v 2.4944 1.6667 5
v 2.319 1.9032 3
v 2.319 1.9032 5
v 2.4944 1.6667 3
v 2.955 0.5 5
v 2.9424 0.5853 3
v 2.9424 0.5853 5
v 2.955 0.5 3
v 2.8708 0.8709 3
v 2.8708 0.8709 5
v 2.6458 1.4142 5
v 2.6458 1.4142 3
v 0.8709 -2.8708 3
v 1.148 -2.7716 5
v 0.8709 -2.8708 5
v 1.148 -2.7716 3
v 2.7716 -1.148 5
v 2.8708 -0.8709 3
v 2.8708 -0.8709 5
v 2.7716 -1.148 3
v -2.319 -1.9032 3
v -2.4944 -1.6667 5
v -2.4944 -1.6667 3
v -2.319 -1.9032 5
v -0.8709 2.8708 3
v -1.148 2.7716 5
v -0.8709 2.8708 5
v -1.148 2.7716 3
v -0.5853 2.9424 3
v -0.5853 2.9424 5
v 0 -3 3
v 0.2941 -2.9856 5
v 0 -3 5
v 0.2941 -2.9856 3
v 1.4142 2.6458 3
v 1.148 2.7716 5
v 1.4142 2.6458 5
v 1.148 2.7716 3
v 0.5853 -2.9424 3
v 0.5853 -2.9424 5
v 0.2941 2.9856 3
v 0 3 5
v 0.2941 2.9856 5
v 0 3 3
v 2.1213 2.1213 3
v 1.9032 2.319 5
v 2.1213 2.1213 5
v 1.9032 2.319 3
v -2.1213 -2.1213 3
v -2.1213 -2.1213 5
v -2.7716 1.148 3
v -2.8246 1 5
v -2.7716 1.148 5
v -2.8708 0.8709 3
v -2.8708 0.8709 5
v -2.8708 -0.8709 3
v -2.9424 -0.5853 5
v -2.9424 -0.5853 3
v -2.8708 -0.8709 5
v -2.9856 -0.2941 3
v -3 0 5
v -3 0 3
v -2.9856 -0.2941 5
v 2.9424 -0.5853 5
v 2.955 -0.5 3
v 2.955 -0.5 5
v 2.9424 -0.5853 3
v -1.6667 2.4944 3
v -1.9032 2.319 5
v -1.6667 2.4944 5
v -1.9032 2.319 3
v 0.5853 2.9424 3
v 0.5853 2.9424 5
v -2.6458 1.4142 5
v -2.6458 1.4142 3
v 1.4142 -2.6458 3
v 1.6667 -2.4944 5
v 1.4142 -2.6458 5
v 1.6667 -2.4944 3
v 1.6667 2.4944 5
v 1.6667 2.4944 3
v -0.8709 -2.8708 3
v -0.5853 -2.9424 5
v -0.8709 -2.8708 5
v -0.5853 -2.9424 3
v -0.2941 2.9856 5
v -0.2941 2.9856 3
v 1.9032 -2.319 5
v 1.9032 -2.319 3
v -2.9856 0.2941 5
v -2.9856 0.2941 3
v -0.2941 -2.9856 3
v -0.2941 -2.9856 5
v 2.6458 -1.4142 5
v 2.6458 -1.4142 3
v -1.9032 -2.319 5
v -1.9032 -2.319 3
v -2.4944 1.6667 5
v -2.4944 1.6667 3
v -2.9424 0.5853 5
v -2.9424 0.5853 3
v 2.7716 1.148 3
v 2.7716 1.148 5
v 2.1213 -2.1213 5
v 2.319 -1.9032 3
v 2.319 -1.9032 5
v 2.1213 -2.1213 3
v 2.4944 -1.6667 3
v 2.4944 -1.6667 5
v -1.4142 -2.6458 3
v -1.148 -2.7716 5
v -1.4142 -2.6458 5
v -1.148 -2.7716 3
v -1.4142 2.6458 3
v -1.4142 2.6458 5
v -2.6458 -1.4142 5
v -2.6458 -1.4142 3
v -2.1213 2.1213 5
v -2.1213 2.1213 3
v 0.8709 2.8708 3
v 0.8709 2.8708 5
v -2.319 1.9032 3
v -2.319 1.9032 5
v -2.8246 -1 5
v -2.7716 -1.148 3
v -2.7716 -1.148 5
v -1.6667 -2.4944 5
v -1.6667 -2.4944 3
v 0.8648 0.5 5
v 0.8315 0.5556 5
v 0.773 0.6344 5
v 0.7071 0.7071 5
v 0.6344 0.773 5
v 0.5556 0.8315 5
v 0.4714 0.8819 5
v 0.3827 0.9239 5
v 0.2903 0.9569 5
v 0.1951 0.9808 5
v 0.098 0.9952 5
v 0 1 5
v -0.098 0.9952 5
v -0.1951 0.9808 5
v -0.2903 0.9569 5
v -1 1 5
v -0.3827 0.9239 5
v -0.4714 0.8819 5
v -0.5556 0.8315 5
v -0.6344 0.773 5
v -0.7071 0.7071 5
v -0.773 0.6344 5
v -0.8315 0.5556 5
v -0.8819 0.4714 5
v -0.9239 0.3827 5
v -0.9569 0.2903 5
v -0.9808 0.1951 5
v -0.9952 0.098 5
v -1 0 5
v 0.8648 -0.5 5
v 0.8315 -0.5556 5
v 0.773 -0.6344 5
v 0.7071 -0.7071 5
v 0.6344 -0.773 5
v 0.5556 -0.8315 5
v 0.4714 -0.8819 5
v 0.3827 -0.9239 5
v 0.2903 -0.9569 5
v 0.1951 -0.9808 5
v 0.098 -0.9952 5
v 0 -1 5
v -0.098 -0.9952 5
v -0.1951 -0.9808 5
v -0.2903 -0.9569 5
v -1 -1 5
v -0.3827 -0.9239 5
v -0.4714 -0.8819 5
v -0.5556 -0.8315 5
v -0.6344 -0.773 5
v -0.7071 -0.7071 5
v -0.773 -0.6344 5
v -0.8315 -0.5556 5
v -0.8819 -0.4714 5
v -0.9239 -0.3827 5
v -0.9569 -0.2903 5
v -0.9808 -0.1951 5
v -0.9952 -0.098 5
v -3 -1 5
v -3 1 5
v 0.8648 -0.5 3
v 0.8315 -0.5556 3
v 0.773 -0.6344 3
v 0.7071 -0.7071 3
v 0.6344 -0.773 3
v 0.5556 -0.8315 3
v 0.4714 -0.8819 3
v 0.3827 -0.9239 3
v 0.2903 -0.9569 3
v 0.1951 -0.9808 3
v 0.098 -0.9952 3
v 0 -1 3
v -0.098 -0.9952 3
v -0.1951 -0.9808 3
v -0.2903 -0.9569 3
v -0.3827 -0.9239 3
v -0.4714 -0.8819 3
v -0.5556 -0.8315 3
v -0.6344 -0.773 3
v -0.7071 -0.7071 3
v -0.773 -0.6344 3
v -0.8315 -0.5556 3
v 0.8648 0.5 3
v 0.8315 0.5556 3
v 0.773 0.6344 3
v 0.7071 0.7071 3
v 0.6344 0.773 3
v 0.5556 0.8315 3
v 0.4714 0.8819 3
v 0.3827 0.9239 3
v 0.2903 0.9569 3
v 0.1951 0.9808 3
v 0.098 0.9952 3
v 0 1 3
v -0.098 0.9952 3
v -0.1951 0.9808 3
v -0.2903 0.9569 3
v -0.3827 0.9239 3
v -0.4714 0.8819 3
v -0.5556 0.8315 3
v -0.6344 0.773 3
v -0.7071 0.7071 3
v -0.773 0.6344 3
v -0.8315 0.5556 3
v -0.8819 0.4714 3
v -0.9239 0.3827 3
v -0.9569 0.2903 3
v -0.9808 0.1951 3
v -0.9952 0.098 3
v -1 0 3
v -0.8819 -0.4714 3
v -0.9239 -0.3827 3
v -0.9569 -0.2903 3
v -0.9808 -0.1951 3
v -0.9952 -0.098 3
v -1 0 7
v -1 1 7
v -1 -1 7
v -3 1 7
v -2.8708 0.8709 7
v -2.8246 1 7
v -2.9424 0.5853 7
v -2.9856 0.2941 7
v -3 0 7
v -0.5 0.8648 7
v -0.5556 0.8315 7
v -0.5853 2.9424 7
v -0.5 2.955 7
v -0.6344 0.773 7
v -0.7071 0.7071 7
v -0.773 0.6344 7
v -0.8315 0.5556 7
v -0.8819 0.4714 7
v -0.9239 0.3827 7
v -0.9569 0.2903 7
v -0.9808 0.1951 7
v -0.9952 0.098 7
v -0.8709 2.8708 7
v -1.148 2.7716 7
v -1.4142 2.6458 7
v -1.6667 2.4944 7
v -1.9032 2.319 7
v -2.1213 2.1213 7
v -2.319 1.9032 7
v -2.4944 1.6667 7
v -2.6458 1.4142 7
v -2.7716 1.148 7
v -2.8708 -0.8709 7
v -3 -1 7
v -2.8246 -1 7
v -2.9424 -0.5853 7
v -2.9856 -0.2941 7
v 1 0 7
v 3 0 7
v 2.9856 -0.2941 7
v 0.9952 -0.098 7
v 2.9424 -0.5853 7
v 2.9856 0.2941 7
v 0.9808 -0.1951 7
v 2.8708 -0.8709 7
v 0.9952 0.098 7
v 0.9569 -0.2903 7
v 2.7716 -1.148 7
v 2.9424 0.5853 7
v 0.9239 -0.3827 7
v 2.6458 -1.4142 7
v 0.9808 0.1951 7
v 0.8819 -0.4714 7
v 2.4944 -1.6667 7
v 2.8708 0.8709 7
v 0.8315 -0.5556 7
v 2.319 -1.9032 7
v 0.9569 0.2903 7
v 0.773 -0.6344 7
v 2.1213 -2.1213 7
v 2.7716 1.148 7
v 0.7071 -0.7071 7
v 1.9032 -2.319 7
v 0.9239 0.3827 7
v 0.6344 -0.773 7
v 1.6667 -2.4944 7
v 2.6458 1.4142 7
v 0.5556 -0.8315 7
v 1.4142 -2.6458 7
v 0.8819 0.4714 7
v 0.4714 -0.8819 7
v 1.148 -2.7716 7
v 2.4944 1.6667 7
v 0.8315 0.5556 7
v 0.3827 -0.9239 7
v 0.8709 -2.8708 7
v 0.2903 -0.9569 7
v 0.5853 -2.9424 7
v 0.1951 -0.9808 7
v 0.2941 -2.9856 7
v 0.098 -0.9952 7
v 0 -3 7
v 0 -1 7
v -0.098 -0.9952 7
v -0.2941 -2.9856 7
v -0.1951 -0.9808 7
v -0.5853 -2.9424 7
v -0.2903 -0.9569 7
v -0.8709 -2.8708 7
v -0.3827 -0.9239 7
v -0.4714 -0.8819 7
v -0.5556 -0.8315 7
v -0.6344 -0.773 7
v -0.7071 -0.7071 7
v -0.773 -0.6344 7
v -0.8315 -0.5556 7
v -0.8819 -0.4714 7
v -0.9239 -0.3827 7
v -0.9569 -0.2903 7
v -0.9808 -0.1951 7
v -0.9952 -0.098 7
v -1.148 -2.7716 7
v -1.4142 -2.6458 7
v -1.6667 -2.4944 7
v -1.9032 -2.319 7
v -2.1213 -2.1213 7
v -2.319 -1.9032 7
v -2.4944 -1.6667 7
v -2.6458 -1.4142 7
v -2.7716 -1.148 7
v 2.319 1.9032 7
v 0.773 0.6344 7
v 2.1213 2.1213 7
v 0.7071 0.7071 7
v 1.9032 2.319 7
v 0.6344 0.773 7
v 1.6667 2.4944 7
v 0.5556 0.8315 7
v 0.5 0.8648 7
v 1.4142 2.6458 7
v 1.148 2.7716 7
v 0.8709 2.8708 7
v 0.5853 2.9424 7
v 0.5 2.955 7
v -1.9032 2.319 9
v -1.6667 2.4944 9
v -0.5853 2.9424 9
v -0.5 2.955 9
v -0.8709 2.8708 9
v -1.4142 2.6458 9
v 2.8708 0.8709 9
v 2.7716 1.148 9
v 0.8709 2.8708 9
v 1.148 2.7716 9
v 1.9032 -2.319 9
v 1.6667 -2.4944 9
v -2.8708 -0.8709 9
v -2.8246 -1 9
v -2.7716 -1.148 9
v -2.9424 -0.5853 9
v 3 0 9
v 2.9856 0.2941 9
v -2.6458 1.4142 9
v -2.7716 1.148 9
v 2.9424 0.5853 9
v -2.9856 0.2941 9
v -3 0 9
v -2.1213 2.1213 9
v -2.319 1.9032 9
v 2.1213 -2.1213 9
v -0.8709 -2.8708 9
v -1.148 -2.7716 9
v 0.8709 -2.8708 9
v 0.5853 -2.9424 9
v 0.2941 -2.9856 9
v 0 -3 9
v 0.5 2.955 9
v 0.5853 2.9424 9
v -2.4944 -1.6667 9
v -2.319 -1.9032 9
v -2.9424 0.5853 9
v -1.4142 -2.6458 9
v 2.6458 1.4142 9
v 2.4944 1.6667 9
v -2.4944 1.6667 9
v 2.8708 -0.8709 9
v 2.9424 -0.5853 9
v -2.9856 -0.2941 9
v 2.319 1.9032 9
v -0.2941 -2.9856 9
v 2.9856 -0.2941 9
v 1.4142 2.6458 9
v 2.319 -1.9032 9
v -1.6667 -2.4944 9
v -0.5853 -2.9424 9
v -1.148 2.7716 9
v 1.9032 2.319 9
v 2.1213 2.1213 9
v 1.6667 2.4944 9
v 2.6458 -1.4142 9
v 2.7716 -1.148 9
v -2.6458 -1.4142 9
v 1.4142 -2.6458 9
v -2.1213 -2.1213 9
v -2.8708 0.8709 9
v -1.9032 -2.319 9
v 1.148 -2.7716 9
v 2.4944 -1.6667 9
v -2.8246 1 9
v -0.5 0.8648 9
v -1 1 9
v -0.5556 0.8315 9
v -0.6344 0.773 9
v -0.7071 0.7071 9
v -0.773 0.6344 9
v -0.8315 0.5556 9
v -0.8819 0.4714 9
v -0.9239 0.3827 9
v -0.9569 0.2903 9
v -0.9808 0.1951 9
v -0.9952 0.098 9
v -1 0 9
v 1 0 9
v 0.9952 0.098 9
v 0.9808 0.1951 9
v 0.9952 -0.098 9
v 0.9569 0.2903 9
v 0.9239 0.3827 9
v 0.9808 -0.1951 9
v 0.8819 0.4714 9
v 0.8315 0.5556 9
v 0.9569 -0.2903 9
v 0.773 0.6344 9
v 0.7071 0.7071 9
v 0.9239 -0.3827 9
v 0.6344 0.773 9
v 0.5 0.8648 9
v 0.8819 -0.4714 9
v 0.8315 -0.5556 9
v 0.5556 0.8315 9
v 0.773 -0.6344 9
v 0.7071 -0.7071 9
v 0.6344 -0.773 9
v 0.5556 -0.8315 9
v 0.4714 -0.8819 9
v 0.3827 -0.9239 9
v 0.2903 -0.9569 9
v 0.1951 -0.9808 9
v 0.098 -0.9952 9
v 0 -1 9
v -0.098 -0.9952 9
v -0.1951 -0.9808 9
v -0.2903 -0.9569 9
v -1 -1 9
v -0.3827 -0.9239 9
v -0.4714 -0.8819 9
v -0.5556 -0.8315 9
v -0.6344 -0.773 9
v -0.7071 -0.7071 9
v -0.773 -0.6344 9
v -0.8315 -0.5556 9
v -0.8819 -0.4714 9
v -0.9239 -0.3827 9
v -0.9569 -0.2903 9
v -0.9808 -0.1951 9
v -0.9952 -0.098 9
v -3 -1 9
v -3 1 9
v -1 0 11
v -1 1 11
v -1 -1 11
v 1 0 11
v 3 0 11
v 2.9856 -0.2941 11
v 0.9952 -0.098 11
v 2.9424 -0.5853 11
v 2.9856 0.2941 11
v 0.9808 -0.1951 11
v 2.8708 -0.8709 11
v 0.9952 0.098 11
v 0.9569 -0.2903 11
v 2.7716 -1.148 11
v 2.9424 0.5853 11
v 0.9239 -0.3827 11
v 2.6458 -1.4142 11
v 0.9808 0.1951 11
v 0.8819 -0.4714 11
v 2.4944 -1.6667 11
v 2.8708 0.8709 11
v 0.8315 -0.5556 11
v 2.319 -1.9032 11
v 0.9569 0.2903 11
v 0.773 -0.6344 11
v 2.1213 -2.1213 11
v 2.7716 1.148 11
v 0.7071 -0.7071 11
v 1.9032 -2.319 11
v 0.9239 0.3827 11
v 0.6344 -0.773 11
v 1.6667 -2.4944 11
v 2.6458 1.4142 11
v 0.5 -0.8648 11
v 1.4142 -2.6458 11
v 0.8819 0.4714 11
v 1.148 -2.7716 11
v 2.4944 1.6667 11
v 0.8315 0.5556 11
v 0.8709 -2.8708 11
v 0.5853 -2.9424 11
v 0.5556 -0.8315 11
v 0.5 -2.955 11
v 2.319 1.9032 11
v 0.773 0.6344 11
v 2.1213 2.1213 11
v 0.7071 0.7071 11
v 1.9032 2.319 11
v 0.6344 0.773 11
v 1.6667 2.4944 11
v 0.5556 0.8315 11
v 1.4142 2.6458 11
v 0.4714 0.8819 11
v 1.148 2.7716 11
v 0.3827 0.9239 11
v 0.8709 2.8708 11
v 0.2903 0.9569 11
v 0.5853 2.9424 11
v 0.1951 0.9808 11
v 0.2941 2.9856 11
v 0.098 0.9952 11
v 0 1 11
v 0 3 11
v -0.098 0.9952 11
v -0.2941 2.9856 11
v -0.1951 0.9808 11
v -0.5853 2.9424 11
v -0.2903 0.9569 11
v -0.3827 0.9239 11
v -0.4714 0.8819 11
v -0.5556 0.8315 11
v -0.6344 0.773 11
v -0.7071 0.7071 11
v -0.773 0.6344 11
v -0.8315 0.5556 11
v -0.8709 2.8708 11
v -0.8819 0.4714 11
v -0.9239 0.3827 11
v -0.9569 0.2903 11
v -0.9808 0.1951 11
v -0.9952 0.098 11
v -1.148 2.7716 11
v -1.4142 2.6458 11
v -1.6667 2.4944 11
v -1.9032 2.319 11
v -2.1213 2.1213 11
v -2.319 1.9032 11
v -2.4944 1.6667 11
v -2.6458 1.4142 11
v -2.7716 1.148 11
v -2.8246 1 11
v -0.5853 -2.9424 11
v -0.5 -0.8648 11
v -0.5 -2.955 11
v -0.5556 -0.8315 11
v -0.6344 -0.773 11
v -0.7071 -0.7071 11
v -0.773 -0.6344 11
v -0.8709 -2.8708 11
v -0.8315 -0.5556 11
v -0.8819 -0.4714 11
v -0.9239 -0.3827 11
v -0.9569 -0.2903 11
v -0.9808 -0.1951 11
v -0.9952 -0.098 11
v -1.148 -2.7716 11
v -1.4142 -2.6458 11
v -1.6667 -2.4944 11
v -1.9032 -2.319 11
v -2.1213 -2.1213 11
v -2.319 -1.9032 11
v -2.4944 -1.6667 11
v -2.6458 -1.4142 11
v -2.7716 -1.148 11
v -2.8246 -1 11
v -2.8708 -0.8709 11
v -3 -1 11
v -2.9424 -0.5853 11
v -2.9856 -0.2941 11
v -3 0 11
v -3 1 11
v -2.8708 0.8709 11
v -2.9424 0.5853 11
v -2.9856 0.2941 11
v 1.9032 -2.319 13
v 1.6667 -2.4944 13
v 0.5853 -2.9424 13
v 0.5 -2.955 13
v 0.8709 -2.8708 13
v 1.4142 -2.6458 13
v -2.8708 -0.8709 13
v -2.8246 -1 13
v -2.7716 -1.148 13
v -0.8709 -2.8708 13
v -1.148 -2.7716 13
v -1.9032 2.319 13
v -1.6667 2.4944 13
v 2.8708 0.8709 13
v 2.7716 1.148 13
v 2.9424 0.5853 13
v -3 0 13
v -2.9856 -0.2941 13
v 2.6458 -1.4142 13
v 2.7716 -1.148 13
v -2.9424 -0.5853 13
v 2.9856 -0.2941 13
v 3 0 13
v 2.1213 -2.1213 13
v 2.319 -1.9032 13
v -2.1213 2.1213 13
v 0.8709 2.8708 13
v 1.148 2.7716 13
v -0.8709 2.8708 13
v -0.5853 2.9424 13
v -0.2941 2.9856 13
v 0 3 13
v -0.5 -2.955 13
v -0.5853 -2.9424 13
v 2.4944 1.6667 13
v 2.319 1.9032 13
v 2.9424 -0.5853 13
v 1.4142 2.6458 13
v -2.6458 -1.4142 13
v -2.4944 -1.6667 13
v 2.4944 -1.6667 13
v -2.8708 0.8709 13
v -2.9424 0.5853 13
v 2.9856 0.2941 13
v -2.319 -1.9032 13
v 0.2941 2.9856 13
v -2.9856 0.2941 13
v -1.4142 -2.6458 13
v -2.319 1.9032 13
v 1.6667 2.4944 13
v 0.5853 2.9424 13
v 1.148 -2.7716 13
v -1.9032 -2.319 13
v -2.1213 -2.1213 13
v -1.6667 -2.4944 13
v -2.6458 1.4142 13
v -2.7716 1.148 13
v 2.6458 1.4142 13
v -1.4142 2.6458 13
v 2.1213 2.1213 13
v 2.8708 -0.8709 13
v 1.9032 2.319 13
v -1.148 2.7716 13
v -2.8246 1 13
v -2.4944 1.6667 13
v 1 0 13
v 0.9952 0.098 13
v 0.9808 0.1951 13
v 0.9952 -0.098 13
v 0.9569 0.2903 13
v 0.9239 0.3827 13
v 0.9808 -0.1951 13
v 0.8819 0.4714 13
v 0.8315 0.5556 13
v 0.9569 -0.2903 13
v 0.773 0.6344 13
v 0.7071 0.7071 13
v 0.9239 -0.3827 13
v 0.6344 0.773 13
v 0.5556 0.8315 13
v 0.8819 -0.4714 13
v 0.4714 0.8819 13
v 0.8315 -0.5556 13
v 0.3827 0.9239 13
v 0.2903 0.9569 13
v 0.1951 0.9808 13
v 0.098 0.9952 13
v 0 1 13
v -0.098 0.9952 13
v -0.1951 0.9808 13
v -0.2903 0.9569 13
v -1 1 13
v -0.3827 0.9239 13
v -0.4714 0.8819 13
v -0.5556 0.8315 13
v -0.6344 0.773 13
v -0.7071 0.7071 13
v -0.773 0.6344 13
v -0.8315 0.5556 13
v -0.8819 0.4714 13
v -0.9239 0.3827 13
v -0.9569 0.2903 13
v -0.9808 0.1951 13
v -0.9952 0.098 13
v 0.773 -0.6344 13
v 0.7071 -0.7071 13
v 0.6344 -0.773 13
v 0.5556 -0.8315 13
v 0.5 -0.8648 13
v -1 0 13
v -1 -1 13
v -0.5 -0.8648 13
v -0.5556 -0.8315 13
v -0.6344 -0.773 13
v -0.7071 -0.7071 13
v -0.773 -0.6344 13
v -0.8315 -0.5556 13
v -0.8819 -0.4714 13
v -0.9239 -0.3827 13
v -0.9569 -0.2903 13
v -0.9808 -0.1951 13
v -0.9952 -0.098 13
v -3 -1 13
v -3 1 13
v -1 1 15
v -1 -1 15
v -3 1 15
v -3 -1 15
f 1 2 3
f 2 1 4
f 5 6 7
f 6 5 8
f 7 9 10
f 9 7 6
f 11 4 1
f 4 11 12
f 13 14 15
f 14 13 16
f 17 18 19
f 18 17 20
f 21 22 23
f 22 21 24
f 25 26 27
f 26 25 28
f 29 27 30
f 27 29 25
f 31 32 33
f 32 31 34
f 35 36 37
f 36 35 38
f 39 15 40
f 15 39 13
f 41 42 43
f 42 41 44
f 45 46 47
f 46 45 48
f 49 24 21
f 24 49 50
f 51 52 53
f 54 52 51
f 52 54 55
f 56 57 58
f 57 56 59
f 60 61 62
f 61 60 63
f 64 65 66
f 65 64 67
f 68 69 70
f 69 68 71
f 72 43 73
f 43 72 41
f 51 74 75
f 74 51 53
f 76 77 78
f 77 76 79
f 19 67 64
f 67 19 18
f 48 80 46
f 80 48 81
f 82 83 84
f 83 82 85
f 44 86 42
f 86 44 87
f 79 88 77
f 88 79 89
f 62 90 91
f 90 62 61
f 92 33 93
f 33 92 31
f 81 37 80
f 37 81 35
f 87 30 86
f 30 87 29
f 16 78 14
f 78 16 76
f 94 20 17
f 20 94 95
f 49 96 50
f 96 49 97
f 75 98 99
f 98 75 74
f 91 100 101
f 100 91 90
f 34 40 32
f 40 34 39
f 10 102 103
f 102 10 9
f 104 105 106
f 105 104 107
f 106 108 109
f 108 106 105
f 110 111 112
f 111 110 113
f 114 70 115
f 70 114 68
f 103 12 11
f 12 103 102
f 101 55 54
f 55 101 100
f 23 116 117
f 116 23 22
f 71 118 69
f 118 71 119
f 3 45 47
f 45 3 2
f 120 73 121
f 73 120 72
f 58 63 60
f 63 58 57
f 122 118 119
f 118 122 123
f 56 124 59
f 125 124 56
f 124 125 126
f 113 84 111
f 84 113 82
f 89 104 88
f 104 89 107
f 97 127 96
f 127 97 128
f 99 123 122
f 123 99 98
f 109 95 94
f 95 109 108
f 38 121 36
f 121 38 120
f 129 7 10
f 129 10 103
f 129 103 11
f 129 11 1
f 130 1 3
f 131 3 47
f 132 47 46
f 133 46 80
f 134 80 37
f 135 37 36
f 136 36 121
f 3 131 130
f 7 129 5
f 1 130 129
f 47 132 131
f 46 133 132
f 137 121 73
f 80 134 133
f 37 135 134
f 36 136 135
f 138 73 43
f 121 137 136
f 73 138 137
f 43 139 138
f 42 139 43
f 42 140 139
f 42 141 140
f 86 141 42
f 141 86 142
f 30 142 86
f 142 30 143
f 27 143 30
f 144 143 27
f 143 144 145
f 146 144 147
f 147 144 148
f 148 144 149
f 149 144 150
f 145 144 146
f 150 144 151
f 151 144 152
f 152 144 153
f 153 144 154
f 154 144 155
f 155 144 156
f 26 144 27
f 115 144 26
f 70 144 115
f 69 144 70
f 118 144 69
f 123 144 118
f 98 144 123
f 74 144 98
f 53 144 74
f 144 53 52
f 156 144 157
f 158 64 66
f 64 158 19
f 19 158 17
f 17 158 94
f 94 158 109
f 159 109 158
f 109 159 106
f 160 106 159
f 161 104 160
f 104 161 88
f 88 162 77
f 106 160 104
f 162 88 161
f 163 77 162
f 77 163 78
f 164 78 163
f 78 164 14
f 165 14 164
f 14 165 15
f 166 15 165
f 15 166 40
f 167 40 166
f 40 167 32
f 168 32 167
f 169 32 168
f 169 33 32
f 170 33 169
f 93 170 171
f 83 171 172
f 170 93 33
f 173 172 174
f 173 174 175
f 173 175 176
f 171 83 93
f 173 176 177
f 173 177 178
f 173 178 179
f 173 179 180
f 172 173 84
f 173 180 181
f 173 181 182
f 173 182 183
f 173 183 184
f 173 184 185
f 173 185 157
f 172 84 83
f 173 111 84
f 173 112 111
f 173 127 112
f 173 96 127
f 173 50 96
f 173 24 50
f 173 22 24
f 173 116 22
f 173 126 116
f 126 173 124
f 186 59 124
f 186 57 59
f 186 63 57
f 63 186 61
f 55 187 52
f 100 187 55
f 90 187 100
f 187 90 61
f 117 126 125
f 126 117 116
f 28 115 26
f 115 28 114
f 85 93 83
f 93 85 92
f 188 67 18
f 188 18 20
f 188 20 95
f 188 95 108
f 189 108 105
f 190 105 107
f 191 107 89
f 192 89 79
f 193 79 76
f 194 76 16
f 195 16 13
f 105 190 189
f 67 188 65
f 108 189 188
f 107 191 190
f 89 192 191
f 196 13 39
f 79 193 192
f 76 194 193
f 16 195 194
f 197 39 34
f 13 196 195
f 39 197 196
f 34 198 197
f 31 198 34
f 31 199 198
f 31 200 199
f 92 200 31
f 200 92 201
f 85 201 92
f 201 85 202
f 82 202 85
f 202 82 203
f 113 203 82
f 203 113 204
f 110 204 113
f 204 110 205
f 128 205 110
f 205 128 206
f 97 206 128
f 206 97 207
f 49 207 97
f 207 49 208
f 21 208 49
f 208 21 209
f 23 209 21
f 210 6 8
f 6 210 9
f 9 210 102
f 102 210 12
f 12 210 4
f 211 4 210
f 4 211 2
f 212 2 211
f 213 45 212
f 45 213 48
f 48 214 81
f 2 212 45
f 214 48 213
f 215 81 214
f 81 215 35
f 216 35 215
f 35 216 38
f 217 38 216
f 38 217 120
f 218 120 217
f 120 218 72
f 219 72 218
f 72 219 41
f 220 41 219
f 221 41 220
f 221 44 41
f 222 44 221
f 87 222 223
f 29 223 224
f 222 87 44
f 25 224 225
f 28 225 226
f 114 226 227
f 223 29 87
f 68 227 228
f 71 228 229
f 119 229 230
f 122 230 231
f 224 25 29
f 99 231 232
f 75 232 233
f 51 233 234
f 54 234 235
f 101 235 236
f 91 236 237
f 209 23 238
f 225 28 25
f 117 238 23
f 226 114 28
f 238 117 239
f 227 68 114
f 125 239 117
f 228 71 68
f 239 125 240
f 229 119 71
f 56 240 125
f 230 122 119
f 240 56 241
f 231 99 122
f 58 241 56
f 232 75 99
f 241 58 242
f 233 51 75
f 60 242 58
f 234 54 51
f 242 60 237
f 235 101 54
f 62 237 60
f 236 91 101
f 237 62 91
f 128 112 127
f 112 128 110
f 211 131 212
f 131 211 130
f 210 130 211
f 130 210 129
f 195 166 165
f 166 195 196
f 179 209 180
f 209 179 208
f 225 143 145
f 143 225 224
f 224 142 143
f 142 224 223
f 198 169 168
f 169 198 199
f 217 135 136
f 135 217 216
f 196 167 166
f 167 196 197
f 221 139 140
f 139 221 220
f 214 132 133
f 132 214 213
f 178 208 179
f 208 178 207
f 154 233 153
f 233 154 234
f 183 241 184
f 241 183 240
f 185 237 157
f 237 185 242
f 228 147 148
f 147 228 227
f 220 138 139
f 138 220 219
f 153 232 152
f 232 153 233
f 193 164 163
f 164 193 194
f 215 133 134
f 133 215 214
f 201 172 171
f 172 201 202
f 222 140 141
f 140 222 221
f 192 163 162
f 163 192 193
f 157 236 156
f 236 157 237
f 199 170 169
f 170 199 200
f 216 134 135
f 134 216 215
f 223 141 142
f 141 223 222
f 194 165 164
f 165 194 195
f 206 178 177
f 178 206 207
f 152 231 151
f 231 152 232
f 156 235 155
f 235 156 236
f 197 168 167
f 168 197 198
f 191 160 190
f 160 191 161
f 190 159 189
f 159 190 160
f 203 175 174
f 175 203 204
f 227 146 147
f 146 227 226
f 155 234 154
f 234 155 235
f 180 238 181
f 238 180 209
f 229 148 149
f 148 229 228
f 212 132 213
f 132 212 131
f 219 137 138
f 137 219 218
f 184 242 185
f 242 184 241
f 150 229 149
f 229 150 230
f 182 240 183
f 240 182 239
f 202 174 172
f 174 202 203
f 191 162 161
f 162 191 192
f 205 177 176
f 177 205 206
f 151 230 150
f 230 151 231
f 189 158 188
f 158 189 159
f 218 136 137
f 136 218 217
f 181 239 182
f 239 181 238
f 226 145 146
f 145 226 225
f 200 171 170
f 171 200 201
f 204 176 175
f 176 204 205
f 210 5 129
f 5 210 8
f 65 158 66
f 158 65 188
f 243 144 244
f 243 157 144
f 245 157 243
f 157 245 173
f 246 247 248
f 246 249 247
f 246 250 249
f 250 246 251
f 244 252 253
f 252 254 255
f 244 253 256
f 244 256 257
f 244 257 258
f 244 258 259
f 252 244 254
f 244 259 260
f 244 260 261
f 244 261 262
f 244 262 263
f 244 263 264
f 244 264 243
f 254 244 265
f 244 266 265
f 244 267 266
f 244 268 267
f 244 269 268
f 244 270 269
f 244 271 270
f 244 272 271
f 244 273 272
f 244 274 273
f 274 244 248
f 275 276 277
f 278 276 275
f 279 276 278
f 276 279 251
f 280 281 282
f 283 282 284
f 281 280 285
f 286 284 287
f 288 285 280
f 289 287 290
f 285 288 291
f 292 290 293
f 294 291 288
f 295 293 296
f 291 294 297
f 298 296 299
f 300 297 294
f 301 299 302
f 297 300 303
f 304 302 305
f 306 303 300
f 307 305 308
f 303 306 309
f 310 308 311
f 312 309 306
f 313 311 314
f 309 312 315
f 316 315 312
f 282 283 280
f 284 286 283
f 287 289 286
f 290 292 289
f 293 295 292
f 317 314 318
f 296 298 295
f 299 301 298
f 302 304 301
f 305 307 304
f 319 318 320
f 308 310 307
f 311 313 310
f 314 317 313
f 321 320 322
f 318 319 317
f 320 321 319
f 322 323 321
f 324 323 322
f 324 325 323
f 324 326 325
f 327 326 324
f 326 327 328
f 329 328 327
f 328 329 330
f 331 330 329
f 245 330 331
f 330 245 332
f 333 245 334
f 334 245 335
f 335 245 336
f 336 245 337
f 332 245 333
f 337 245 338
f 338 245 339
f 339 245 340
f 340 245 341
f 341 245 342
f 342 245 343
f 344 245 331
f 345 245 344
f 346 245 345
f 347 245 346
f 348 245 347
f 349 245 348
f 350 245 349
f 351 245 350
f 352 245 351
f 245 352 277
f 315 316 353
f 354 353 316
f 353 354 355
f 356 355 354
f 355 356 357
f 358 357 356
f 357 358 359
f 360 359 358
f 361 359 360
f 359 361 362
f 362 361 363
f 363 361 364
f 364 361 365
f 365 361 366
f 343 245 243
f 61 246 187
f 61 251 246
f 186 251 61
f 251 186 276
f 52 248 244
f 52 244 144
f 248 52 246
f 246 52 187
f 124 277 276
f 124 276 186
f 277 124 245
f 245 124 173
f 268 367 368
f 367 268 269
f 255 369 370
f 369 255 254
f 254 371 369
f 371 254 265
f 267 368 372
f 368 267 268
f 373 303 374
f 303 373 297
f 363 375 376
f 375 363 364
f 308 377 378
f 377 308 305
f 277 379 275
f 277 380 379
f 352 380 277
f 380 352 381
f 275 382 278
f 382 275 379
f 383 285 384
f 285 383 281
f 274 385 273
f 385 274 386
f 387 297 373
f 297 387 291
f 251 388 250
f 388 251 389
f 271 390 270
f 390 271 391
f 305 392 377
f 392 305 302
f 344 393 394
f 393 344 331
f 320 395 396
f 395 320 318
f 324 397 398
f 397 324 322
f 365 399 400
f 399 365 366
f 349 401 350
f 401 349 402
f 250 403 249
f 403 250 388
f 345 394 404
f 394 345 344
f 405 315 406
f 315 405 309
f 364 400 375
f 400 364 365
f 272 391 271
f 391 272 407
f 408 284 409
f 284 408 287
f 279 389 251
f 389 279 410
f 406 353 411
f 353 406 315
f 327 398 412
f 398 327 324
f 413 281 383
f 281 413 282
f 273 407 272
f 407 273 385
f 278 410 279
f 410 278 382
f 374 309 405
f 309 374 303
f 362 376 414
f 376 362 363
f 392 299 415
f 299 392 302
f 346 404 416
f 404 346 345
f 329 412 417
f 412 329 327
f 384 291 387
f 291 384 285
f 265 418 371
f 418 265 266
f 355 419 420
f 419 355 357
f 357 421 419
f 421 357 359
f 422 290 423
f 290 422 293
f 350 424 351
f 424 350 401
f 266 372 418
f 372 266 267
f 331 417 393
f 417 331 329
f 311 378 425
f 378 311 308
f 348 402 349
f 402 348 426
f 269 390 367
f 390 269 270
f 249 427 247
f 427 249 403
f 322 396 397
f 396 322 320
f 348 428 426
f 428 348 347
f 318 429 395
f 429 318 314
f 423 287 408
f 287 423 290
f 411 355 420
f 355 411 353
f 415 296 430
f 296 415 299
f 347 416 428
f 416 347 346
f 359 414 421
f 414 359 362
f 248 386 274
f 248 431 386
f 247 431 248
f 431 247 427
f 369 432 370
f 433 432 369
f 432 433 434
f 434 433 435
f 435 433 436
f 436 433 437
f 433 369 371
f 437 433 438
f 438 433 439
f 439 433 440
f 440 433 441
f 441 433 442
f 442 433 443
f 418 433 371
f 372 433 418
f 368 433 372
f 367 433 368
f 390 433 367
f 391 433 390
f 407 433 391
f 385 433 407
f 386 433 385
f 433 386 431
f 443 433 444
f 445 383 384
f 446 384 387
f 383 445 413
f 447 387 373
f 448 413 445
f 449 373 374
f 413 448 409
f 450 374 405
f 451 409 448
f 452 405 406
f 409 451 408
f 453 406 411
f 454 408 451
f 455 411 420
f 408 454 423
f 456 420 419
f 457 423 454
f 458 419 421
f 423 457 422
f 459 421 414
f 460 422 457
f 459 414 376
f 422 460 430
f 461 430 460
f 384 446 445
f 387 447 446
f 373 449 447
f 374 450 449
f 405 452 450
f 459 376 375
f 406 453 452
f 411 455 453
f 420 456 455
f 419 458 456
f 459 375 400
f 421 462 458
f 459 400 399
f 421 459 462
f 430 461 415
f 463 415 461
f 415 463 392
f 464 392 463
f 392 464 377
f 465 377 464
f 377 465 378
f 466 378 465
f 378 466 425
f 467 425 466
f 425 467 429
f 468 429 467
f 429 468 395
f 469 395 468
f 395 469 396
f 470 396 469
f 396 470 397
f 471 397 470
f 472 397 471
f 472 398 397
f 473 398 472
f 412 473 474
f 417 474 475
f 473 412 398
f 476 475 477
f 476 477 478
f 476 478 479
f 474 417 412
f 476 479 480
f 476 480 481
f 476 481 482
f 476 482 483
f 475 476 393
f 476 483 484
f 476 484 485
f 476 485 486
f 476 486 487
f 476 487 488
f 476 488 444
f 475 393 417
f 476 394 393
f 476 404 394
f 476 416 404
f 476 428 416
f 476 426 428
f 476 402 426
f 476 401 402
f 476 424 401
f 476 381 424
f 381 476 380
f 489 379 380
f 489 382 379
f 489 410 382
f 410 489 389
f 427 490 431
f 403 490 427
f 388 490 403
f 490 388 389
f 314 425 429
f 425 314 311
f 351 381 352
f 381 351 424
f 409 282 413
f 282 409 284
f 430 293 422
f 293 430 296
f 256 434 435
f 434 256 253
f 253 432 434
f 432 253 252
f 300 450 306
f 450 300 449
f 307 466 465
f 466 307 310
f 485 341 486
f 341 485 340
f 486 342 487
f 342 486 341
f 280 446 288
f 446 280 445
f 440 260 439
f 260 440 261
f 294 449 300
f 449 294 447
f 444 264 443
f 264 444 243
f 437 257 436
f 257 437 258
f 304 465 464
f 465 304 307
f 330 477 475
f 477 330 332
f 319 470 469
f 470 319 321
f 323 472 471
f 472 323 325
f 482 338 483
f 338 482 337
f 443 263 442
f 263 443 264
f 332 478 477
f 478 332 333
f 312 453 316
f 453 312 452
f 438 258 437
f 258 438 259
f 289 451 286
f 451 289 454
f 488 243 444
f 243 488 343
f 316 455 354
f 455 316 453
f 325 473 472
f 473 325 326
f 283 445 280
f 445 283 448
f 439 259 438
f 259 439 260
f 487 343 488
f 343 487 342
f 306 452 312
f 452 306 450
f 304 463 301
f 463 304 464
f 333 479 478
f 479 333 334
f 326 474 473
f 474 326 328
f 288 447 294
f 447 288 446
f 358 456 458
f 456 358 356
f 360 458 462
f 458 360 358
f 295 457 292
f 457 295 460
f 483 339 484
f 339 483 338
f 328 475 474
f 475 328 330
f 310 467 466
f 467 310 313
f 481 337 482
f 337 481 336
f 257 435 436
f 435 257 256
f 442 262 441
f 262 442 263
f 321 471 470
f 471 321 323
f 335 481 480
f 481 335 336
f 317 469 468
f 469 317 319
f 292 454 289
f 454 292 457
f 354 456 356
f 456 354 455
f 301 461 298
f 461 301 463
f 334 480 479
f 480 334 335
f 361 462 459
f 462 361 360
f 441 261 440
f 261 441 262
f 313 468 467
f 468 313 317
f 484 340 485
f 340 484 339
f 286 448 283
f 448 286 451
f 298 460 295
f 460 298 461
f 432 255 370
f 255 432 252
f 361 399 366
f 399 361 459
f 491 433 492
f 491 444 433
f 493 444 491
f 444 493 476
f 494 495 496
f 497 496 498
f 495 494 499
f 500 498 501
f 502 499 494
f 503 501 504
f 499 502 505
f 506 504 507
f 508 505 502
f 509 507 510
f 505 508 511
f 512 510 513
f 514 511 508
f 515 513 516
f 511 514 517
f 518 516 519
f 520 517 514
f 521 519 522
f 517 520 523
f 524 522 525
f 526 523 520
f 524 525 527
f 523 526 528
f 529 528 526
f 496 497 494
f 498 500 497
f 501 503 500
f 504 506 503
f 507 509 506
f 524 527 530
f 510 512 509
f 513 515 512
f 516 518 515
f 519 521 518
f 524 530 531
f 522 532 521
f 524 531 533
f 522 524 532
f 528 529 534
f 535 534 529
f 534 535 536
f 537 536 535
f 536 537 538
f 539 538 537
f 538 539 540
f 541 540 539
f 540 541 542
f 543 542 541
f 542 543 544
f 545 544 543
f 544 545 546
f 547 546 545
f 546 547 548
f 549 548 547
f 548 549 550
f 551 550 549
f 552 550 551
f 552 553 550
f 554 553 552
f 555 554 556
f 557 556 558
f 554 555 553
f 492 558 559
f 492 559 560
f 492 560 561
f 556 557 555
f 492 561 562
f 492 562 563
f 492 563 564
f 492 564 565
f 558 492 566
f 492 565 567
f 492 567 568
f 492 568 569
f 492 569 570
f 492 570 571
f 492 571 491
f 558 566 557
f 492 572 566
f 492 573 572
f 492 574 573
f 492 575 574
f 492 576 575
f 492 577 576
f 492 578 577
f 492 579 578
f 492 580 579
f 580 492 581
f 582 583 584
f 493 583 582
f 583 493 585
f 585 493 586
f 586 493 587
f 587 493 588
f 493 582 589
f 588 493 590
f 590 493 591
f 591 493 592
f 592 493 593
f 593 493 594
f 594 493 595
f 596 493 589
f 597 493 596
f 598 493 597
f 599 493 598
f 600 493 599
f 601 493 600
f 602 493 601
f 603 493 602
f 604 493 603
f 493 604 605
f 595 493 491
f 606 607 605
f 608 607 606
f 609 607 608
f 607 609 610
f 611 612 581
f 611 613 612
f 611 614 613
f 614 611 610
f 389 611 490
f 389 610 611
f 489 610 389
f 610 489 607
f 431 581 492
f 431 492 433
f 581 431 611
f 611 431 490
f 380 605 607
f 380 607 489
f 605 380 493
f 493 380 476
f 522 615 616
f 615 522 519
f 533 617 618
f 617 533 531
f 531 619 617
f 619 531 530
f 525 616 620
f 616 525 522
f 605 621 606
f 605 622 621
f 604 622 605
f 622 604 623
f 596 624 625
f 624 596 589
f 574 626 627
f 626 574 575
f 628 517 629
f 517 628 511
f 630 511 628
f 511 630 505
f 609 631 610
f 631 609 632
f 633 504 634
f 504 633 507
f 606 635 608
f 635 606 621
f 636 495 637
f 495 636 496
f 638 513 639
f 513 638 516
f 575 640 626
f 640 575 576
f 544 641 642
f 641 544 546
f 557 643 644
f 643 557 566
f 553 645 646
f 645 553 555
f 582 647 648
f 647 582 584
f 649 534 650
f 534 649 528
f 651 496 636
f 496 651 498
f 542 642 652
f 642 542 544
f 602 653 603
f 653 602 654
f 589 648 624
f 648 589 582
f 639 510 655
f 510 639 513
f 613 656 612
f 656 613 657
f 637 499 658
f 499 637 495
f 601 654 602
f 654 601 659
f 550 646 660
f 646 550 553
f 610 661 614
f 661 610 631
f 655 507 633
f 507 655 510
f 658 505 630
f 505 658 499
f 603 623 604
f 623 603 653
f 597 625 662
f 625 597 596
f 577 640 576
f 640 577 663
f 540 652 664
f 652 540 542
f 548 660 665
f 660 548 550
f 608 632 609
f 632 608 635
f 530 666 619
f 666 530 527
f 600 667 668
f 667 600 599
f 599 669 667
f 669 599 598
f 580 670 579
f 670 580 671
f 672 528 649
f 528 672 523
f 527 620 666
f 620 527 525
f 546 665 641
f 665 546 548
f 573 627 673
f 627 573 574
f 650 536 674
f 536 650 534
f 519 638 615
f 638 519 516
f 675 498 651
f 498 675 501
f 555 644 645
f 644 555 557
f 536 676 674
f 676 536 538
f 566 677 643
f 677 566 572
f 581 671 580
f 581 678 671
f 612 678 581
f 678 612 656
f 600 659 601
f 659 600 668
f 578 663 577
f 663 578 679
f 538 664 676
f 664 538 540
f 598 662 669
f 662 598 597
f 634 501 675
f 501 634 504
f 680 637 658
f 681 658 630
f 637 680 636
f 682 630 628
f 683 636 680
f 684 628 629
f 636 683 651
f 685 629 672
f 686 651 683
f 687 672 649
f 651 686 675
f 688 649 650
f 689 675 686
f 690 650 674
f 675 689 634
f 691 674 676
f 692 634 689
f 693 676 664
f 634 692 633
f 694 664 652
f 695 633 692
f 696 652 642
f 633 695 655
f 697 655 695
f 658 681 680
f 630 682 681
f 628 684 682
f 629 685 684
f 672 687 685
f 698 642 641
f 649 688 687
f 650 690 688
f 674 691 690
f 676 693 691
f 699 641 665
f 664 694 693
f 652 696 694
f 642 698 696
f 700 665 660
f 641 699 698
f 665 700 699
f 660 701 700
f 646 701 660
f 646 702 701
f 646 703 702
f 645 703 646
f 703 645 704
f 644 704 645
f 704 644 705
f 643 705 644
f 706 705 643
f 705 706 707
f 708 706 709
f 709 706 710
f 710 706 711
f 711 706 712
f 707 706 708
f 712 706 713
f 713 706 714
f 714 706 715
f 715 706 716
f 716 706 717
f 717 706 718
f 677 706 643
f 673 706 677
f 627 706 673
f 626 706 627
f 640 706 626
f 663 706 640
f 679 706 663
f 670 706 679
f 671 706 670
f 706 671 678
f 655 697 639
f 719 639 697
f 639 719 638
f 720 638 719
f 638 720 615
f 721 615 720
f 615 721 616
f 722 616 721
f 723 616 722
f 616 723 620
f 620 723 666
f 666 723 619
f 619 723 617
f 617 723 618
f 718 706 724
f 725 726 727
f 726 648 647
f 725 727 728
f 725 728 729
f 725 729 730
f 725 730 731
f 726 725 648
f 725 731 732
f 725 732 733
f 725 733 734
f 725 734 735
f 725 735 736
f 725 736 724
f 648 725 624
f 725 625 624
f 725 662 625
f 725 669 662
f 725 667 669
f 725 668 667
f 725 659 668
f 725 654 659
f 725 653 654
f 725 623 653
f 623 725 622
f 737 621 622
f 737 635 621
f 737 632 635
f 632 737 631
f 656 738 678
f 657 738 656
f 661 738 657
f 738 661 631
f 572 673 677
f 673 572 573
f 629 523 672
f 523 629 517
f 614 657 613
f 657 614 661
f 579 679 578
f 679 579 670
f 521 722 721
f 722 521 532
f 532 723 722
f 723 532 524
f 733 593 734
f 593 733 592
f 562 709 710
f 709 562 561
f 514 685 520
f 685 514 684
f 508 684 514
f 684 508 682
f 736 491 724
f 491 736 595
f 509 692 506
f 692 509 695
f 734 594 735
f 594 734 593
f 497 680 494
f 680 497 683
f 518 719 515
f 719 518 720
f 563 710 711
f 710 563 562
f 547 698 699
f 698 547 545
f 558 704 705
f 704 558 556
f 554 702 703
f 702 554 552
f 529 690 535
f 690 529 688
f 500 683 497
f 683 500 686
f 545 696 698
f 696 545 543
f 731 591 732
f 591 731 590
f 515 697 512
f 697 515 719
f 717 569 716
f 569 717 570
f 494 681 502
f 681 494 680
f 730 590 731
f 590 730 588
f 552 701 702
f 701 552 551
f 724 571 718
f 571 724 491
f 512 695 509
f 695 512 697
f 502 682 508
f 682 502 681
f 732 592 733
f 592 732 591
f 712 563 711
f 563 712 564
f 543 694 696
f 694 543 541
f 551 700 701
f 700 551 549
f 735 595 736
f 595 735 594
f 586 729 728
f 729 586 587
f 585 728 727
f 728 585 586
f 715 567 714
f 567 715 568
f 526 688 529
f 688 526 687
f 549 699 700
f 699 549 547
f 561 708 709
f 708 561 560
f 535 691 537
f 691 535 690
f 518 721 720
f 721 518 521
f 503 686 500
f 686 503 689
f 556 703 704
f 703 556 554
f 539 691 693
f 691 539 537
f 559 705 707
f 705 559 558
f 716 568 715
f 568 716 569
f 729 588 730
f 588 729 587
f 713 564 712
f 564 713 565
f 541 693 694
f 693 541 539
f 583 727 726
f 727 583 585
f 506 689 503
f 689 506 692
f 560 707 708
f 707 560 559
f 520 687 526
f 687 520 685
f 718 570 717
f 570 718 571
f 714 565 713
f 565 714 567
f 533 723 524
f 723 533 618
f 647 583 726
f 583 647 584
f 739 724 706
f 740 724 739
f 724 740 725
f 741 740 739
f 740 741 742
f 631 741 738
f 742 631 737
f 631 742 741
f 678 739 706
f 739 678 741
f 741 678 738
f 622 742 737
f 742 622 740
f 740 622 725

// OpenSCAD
module slotring(outer_radius=3,inner_radius=1,height=2)
{
  difference () 
  {
    cylinder(r=outer_radius,h=height,center=true,$fn=64);
    cylinder(r=inner_radius,h=height,center=true,$fn=64);
    translate([outer_radius/2,0,0])cube([outer_radius,inner_radius,height],center=true);
  }
  
}

module spacer(outer_radius=3,inner_radius=1,height=2)
{
  cube([outer_radius-inner_radius,outer_radius-inner_radius,height],center=true);
}

module onestep(
  outer_radius=3,
  inner_radius=1,
  height=2,
  slotdegree=0
)
{
  rotate([0,0,slotdegree]) slotring(outer_radius,inner_radius,height);
  translate([-outer_radius+inner_radius,0,height])spacer(outer_radius,inner_radius,height);
}

module wireguide(
  outer_radius=3,
  inner_radius=1,
  height=2,
  steps=3
)
{
  echo(steps);
  for (step = [1:steps])
  {
    direction=(step%3-1)*90;
    echo(step*2*height,direction);
    
    translate([0,0,step*2*height]) onestep(outer_radius,inner_radius,height,direction);
//    translate(0,0,step*2*height) 
  }
}


wireguide();

//onestep();
